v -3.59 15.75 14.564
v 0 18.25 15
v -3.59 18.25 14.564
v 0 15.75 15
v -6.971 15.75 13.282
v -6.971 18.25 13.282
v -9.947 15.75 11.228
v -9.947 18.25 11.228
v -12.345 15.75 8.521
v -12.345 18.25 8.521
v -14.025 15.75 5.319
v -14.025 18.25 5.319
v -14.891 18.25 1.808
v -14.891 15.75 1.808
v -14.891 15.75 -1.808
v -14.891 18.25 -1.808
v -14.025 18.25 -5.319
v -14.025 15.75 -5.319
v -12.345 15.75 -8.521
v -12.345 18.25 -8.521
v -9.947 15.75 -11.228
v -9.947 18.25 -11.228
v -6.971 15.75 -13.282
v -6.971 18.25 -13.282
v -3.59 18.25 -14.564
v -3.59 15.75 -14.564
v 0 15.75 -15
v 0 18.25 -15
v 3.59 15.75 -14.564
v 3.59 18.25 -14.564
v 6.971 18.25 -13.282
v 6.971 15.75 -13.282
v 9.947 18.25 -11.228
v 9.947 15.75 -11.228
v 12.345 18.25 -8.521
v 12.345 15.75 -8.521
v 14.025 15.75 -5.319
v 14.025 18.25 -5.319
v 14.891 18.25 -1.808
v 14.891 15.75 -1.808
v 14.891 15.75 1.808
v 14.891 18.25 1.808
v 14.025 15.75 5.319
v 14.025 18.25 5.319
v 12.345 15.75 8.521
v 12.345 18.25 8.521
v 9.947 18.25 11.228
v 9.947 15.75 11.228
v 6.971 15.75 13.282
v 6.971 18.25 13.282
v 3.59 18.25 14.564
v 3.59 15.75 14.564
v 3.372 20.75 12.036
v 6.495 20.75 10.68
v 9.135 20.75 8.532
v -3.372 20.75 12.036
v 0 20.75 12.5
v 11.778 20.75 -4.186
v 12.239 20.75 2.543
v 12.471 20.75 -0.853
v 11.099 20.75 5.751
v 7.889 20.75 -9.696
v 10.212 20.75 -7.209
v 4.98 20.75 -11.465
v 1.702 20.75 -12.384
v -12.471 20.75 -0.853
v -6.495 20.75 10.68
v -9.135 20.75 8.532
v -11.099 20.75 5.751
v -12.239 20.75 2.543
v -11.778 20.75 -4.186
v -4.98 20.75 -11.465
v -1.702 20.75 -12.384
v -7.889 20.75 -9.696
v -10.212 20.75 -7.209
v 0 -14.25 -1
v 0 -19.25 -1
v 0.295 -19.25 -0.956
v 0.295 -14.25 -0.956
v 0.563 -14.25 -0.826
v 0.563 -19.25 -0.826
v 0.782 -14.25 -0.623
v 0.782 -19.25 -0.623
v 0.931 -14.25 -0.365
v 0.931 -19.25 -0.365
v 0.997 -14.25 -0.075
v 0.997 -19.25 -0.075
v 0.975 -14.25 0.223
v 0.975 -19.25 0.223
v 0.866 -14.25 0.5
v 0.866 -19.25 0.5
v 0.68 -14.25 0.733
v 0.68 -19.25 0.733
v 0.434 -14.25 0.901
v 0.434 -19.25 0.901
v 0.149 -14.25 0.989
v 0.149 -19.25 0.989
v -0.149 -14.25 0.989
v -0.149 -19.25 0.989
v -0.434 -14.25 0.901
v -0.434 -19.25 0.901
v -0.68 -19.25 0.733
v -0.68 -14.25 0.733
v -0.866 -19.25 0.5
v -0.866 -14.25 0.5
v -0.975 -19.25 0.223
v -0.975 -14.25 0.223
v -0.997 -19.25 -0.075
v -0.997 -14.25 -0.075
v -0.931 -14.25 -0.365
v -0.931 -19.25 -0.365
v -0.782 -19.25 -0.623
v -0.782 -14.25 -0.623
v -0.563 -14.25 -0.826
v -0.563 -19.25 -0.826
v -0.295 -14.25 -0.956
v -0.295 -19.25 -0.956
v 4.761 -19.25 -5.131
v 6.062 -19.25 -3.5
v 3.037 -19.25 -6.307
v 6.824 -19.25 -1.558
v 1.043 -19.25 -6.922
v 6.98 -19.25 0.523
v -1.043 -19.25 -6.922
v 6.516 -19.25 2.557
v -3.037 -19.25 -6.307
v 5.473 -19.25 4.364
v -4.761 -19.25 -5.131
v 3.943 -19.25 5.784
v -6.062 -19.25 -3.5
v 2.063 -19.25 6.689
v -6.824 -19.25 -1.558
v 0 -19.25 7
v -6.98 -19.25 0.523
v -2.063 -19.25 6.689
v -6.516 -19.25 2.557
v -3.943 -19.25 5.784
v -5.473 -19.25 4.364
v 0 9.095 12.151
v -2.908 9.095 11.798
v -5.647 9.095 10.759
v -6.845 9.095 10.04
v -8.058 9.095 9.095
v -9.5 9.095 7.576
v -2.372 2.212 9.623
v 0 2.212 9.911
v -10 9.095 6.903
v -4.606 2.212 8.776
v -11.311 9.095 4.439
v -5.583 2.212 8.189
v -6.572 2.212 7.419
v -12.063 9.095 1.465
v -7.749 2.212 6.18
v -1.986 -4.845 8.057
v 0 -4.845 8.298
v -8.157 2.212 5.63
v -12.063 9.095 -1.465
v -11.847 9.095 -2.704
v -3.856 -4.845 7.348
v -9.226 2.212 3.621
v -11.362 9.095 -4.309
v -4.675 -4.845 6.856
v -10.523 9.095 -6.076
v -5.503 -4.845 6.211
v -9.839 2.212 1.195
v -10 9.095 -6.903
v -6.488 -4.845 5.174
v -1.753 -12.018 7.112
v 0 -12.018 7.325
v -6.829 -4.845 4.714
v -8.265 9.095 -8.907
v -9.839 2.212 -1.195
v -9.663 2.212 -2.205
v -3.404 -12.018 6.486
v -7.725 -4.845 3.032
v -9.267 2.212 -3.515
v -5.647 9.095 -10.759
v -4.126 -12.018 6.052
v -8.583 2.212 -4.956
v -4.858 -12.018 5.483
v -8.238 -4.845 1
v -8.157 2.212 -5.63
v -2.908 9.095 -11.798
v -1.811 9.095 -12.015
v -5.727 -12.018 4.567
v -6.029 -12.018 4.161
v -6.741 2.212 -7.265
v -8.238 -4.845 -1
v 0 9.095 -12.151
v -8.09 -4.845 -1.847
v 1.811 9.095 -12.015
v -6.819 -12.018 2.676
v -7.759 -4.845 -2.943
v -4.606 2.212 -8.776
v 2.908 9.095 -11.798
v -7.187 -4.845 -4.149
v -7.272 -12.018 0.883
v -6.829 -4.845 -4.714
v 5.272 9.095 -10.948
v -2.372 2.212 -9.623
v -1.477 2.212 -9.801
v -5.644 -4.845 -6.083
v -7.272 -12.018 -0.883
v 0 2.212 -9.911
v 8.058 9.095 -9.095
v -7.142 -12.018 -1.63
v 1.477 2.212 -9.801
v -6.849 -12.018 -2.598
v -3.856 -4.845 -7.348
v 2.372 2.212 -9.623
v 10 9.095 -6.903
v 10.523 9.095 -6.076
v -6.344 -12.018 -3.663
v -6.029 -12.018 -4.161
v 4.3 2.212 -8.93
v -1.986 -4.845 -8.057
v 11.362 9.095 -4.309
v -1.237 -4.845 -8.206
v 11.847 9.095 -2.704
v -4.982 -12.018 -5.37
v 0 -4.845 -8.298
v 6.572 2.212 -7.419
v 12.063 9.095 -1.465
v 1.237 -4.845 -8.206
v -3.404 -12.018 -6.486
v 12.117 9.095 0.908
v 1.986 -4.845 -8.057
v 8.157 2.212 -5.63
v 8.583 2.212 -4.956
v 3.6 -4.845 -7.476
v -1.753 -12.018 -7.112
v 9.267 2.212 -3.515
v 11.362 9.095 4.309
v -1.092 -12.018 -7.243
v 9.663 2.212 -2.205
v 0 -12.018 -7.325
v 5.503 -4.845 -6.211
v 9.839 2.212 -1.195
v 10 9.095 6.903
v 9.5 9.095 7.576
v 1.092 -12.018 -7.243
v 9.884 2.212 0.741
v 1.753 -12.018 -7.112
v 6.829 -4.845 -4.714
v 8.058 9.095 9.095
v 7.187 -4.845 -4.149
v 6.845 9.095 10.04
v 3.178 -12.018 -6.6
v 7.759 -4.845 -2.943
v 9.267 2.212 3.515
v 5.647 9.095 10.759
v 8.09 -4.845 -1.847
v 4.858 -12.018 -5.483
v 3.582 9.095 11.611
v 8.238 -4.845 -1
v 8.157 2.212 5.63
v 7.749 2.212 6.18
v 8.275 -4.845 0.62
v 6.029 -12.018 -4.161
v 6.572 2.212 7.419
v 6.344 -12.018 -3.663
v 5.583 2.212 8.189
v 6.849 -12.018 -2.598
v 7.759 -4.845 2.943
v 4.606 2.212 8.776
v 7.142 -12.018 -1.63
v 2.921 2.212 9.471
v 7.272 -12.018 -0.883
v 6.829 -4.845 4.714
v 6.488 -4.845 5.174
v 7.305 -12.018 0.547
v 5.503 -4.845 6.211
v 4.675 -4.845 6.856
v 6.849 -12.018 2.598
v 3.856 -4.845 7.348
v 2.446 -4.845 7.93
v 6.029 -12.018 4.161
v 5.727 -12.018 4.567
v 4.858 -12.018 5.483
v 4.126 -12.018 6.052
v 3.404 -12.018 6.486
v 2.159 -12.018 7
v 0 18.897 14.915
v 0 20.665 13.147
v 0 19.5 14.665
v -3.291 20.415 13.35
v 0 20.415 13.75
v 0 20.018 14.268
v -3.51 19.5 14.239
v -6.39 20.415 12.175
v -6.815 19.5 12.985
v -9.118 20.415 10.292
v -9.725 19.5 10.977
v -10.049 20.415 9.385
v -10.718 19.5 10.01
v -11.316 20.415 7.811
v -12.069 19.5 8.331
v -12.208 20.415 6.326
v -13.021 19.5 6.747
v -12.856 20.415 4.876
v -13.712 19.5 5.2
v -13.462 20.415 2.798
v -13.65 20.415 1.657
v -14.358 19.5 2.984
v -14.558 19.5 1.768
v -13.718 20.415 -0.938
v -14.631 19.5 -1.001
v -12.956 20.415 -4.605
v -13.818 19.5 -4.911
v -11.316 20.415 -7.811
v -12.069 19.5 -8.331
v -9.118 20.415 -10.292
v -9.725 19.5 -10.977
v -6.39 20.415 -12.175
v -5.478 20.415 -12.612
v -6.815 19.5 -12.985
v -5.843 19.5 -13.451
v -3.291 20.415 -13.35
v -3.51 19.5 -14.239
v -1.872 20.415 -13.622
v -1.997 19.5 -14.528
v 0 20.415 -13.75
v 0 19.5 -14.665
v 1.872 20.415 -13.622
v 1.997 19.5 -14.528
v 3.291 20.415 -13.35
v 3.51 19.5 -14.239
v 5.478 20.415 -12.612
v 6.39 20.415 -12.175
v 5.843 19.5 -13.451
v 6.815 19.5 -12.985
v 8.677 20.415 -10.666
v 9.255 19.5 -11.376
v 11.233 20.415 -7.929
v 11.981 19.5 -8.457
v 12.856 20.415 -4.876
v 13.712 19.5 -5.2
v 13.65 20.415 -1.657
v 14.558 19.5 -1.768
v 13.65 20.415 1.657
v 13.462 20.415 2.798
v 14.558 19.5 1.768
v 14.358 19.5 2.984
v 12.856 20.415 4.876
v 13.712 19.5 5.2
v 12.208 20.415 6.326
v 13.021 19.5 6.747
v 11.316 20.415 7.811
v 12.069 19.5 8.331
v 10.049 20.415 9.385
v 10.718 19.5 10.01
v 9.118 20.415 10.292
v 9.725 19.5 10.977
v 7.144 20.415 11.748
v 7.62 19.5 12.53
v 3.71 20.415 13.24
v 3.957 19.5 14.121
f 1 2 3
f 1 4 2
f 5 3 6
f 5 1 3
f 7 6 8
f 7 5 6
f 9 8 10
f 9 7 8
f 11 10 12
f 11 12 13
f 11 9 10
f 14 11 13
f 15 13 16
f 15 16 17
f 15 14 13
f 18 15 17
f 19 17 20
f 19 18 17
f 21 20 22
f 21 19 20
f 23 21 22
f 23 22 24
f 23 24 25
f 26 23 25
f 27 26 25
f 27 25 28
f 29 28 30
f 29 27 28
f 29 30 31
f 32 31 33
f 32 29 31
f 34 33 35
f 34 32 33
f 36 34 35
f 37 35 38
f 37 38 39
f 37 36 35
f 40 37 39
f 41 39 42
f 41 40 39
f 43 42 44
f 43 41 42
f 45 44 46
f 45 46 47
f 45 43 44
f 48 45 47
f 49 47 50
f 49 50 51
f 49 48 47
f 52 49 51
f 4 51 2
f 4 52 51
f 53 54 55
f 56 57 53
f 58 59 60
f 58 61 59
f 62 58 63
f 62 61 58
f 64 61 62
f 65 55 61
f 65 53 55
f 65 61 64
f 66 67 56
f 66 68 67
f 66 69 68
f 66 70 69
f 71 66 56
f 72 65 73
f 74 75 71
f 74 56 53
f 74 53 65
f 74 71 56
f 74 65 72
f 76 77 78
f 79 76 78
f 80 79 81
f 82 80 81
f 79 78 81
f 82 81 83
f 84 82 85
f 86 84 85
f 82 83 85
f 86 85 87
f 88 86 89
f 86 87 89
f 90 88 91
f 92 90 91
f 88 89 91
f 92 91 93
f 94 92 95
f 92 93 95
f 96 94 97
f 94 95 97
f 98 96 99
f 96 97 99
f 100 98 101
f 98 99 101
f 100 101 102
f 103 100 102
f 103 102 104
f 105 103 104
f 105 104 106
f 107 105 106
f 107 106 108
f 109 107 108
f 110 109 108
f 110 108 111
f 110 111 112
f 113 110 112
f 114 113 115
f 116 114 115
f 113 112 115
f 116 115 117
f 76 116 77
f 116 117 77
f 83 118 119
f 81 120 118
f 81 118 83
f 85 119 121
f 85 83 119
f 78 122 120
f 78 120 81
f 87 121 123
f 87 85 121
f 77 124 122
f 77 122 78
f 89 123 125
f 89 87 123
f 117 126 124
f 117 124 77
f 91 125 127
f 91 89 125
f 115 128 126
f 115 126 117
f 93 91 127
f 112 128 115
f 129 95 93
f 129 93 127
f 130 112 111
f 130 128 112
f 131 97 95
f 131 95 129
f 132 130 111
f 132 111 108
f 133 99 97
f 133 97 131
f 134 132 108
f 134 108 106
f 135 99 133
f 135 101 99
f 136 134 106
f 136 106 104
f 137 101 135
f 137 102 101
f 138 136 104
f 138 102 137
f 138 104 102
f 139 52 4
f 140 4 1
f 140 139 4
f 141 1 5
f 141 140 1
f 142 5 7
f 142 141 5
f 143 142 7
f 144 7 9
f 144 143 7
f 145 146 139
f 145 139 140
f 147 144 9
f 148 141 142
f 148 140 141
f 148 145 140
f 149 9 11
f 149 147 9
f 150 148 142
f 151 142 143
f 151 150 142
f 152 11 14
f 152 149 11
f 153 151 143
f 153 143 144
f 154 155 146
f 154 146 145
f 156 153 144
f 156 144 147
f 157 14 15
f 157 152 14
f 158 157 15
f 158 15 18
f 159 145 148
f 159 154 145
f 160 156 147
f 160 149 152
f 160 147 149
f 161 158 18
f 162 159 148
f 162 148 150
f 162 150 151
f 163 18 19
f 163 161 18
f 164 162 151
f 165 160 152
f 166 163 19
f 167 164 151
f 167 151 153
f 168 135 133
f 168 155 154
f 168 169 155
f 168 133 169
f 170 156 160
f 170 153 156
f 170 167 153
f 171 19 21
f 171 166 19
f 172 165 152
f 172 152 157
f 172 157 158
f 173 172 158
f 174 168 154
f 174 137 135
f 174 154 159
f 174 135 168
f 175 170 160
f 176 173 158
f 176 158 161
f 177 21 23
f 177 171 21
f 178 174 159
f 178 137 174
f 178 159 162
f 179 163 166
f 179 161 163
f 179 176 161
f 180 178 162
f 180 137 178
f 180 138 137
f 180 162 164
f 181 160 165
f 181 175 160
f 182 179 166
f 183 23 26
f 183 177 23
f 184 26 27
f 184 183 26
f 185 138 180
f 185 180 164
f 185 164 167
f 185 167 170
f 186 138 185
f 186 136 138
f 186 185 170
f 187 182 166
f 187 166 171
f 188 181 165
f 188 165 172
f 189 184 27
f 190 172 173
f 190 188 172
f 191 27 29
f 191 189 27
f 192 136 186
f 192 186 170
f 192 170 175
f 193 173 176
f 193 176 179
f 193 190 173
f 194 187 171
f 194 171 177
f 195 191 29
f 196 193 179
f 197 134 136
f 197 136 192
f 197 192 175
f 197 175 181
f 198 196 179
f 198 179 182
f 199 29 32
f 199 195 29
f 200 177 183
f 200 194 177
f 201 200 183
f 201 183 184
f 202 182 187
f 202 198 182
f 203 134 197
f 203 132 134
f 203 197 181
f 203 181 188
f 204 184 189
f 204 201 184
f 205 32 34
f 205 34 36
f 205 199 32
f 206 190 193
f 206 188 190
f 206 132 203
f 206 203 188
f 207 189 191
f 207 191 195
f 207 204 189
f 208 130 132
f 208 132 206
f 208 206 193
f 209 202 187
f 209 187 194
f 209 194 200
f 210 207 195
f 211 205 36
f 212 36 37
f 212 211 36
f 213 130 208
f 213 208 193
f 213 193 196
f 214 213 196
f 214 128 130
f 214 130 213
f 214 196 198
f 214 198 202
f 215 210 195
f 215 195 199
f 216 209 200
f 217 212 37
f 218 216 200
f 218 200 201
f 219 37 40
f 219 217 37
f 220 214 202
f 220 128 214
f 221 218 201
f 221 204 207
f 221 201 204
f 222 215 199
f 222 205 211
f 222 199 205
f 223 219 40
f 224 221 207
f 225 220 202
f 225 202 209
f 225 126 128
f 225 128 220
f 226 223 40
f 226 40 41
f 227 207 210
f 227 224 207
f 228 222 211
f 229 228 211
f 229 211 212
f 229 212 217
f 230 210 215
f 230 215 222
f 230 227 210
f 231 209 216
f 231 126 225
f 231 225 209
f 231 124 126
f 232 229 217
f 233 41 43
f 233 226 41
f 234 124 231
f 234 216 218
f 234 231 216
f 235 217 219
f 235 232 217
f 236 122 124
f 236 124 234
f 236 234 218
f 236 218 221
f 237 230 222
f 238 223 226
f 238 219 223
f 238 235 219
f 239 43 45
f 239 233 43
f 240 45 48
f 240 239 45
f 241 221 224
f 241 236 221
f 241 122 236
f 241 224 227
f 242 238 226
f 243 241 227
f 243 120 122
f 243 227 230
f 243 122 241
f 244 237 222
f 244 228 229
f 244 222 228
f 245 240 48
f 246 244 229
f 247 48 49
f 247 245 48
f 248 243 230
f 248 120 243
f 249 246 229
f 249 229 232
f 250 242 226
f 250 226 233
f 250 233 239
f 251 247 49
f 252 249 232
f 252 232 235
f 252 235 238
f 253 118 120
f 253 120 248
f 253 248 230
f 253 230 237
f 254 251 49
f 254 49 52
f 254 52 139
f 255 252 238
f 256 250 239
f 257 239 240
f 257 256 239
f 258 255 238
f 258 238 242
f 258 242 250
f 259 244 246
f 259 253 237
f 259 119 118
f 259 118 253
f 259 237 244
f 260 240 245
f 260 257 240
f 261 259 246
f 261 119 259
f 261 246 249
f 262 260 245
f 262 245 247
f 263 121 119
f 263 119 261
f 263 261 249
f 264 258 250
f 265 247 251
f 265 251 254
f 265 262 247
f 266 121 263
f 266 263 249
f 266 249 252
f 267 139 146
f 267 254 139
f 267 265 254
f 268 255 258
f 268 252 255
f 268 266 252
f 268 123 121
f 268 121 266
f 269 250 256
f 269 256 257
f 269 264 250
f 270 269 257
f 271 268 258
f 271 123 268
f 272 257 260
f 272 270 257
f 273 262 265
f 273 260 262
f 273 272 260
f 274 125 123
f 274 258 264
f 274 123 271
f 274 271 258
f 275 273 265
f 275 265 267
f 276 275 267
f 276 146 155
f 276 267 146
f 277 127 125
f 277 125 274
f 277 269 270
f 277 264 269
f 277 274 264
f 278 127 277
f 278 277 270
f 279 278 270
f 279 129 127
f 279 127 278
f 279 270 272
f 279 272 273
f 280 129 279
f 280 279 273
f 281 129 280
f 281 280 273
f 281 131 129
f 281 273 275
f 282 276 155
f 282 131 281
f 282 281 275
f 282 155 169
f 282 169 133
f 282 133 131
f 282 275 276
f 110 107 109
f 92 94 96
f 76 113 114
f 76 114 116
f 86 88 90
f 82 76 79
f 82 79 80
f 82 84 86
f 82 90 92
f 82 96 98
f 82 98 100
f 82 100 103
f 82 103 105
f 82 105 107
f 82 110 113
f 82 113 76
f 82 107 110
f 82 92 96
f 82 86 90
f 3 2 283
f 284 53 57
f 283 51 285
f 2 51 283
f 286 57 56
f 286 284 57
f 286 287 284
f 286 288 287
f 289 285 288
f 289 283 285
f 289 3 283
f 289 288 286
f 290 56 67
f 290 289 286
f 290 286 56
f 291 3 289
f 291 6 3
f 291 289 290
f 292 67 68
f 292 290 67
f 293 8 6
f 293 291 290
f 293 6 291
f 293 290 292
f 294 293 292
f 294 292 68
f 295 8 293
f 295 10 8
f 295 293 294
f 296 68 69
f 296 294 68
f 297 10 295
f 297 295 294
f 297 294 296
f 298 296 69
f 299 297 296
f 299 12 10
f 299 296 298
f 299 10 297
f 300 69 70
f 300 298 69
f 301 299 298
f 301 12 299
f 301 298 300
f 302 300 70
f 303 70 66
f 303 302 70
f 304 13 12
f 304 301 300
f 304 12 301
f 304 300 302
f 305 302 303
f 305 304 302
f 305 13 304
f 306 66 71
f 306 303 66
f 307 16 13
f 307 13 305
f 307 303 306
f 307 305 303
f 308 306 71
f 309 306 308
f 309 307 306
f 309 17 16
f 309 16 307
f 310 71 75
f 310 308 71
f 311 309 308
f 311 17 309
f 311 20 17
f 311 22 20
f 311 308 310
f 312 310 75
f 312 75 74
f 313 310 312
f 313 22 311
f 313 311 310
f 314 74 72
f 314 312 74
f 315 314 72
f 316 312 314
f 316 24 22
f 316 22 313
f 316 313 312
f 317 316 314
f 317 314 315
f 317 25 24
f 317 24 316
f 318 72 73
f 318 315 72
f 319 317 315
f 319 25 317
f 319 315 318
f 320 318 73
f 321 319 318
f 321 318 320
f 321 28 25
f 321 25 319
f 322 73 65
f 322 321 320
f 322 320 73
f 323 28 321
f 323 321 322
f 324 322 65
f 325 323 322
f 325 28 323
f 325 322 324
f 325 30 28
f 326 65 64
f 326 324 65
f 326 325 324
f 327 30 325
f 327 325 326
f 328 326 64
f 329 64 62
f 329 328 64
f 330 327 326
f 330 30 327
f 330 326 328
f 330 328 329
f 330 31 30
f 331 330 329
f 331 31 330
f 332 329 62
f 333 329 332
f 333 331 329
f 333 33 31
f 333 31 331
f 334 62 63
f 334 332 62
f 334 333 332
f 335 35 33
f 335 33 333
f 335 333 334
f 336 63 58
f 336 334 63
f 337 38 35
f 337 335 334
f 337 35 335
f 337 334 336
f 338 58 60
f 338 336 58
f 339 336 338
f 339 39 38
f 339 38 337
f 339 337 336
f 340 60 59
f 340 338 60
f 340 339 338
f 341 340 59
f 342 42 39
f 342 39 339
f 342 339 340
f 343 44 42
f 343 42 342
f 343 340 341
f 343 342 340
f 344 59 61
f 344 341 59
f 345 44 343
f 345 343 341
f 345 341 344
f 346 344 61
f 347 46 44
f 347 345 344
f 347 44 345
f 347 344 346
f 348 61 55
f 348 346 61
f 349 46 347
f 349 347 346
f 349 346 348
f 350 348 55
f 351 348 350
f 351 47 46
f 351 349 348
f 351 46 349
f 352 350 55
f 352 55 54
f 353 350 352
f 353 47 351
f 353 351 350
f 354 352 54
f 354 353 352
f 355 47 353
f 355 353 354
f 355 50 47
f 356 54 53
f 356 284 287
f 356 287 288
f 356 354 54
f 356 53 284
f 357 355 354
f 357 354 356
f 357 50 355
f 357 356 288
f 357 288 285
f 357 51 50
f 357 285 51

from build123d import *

# Parameters (mm, degrees)
SKETCH2_R          = 1
CUT_EXTRUDE1_DEPTH = 5


with BuildPart() as part:
    # Sketch1 → Revolve1 (revolve)
    with BuildSketch(Plane(origin=(0, 0, 0), x_dir=(0, 0, -1), z_dir=(1, 0, 0))):
        with BuildLine():
            Line((-7, -19.250050998), (0, -19.250050998))
            Line((0, -19.250050998), (0, 20.749949002))
            Line((0, 20.749949002), (-12.5, 20.749949002))
            ThreePointArc((-12.5, 20.749949002), (-14.267766953, 20.017715955), (-15, 18.249949002))
            Line((-15, 18.249949002), (-15, 15.749949002))
            ThreePointArc((-15, 15.749949002), (-9.025461564, -1.298727927), (-7, -19.250050998))
        make_face()
    revolve(axis=Axis((0, 28.85, 0), (0, -1, 0)))

    # Sketch2 → Cut-Extrude1 (cut)
    with BuildSketch(Plane.XZ.offset(19.250050998)):
        with Locations(Location((0, 0, 0), (0, 0, 270))):
            Circle(SKETCH2_R)
    extrude(amount=-CUT_EXTRUDE1_DEPTH, mode=Mode.SUBTRACT)


solid = part.part
